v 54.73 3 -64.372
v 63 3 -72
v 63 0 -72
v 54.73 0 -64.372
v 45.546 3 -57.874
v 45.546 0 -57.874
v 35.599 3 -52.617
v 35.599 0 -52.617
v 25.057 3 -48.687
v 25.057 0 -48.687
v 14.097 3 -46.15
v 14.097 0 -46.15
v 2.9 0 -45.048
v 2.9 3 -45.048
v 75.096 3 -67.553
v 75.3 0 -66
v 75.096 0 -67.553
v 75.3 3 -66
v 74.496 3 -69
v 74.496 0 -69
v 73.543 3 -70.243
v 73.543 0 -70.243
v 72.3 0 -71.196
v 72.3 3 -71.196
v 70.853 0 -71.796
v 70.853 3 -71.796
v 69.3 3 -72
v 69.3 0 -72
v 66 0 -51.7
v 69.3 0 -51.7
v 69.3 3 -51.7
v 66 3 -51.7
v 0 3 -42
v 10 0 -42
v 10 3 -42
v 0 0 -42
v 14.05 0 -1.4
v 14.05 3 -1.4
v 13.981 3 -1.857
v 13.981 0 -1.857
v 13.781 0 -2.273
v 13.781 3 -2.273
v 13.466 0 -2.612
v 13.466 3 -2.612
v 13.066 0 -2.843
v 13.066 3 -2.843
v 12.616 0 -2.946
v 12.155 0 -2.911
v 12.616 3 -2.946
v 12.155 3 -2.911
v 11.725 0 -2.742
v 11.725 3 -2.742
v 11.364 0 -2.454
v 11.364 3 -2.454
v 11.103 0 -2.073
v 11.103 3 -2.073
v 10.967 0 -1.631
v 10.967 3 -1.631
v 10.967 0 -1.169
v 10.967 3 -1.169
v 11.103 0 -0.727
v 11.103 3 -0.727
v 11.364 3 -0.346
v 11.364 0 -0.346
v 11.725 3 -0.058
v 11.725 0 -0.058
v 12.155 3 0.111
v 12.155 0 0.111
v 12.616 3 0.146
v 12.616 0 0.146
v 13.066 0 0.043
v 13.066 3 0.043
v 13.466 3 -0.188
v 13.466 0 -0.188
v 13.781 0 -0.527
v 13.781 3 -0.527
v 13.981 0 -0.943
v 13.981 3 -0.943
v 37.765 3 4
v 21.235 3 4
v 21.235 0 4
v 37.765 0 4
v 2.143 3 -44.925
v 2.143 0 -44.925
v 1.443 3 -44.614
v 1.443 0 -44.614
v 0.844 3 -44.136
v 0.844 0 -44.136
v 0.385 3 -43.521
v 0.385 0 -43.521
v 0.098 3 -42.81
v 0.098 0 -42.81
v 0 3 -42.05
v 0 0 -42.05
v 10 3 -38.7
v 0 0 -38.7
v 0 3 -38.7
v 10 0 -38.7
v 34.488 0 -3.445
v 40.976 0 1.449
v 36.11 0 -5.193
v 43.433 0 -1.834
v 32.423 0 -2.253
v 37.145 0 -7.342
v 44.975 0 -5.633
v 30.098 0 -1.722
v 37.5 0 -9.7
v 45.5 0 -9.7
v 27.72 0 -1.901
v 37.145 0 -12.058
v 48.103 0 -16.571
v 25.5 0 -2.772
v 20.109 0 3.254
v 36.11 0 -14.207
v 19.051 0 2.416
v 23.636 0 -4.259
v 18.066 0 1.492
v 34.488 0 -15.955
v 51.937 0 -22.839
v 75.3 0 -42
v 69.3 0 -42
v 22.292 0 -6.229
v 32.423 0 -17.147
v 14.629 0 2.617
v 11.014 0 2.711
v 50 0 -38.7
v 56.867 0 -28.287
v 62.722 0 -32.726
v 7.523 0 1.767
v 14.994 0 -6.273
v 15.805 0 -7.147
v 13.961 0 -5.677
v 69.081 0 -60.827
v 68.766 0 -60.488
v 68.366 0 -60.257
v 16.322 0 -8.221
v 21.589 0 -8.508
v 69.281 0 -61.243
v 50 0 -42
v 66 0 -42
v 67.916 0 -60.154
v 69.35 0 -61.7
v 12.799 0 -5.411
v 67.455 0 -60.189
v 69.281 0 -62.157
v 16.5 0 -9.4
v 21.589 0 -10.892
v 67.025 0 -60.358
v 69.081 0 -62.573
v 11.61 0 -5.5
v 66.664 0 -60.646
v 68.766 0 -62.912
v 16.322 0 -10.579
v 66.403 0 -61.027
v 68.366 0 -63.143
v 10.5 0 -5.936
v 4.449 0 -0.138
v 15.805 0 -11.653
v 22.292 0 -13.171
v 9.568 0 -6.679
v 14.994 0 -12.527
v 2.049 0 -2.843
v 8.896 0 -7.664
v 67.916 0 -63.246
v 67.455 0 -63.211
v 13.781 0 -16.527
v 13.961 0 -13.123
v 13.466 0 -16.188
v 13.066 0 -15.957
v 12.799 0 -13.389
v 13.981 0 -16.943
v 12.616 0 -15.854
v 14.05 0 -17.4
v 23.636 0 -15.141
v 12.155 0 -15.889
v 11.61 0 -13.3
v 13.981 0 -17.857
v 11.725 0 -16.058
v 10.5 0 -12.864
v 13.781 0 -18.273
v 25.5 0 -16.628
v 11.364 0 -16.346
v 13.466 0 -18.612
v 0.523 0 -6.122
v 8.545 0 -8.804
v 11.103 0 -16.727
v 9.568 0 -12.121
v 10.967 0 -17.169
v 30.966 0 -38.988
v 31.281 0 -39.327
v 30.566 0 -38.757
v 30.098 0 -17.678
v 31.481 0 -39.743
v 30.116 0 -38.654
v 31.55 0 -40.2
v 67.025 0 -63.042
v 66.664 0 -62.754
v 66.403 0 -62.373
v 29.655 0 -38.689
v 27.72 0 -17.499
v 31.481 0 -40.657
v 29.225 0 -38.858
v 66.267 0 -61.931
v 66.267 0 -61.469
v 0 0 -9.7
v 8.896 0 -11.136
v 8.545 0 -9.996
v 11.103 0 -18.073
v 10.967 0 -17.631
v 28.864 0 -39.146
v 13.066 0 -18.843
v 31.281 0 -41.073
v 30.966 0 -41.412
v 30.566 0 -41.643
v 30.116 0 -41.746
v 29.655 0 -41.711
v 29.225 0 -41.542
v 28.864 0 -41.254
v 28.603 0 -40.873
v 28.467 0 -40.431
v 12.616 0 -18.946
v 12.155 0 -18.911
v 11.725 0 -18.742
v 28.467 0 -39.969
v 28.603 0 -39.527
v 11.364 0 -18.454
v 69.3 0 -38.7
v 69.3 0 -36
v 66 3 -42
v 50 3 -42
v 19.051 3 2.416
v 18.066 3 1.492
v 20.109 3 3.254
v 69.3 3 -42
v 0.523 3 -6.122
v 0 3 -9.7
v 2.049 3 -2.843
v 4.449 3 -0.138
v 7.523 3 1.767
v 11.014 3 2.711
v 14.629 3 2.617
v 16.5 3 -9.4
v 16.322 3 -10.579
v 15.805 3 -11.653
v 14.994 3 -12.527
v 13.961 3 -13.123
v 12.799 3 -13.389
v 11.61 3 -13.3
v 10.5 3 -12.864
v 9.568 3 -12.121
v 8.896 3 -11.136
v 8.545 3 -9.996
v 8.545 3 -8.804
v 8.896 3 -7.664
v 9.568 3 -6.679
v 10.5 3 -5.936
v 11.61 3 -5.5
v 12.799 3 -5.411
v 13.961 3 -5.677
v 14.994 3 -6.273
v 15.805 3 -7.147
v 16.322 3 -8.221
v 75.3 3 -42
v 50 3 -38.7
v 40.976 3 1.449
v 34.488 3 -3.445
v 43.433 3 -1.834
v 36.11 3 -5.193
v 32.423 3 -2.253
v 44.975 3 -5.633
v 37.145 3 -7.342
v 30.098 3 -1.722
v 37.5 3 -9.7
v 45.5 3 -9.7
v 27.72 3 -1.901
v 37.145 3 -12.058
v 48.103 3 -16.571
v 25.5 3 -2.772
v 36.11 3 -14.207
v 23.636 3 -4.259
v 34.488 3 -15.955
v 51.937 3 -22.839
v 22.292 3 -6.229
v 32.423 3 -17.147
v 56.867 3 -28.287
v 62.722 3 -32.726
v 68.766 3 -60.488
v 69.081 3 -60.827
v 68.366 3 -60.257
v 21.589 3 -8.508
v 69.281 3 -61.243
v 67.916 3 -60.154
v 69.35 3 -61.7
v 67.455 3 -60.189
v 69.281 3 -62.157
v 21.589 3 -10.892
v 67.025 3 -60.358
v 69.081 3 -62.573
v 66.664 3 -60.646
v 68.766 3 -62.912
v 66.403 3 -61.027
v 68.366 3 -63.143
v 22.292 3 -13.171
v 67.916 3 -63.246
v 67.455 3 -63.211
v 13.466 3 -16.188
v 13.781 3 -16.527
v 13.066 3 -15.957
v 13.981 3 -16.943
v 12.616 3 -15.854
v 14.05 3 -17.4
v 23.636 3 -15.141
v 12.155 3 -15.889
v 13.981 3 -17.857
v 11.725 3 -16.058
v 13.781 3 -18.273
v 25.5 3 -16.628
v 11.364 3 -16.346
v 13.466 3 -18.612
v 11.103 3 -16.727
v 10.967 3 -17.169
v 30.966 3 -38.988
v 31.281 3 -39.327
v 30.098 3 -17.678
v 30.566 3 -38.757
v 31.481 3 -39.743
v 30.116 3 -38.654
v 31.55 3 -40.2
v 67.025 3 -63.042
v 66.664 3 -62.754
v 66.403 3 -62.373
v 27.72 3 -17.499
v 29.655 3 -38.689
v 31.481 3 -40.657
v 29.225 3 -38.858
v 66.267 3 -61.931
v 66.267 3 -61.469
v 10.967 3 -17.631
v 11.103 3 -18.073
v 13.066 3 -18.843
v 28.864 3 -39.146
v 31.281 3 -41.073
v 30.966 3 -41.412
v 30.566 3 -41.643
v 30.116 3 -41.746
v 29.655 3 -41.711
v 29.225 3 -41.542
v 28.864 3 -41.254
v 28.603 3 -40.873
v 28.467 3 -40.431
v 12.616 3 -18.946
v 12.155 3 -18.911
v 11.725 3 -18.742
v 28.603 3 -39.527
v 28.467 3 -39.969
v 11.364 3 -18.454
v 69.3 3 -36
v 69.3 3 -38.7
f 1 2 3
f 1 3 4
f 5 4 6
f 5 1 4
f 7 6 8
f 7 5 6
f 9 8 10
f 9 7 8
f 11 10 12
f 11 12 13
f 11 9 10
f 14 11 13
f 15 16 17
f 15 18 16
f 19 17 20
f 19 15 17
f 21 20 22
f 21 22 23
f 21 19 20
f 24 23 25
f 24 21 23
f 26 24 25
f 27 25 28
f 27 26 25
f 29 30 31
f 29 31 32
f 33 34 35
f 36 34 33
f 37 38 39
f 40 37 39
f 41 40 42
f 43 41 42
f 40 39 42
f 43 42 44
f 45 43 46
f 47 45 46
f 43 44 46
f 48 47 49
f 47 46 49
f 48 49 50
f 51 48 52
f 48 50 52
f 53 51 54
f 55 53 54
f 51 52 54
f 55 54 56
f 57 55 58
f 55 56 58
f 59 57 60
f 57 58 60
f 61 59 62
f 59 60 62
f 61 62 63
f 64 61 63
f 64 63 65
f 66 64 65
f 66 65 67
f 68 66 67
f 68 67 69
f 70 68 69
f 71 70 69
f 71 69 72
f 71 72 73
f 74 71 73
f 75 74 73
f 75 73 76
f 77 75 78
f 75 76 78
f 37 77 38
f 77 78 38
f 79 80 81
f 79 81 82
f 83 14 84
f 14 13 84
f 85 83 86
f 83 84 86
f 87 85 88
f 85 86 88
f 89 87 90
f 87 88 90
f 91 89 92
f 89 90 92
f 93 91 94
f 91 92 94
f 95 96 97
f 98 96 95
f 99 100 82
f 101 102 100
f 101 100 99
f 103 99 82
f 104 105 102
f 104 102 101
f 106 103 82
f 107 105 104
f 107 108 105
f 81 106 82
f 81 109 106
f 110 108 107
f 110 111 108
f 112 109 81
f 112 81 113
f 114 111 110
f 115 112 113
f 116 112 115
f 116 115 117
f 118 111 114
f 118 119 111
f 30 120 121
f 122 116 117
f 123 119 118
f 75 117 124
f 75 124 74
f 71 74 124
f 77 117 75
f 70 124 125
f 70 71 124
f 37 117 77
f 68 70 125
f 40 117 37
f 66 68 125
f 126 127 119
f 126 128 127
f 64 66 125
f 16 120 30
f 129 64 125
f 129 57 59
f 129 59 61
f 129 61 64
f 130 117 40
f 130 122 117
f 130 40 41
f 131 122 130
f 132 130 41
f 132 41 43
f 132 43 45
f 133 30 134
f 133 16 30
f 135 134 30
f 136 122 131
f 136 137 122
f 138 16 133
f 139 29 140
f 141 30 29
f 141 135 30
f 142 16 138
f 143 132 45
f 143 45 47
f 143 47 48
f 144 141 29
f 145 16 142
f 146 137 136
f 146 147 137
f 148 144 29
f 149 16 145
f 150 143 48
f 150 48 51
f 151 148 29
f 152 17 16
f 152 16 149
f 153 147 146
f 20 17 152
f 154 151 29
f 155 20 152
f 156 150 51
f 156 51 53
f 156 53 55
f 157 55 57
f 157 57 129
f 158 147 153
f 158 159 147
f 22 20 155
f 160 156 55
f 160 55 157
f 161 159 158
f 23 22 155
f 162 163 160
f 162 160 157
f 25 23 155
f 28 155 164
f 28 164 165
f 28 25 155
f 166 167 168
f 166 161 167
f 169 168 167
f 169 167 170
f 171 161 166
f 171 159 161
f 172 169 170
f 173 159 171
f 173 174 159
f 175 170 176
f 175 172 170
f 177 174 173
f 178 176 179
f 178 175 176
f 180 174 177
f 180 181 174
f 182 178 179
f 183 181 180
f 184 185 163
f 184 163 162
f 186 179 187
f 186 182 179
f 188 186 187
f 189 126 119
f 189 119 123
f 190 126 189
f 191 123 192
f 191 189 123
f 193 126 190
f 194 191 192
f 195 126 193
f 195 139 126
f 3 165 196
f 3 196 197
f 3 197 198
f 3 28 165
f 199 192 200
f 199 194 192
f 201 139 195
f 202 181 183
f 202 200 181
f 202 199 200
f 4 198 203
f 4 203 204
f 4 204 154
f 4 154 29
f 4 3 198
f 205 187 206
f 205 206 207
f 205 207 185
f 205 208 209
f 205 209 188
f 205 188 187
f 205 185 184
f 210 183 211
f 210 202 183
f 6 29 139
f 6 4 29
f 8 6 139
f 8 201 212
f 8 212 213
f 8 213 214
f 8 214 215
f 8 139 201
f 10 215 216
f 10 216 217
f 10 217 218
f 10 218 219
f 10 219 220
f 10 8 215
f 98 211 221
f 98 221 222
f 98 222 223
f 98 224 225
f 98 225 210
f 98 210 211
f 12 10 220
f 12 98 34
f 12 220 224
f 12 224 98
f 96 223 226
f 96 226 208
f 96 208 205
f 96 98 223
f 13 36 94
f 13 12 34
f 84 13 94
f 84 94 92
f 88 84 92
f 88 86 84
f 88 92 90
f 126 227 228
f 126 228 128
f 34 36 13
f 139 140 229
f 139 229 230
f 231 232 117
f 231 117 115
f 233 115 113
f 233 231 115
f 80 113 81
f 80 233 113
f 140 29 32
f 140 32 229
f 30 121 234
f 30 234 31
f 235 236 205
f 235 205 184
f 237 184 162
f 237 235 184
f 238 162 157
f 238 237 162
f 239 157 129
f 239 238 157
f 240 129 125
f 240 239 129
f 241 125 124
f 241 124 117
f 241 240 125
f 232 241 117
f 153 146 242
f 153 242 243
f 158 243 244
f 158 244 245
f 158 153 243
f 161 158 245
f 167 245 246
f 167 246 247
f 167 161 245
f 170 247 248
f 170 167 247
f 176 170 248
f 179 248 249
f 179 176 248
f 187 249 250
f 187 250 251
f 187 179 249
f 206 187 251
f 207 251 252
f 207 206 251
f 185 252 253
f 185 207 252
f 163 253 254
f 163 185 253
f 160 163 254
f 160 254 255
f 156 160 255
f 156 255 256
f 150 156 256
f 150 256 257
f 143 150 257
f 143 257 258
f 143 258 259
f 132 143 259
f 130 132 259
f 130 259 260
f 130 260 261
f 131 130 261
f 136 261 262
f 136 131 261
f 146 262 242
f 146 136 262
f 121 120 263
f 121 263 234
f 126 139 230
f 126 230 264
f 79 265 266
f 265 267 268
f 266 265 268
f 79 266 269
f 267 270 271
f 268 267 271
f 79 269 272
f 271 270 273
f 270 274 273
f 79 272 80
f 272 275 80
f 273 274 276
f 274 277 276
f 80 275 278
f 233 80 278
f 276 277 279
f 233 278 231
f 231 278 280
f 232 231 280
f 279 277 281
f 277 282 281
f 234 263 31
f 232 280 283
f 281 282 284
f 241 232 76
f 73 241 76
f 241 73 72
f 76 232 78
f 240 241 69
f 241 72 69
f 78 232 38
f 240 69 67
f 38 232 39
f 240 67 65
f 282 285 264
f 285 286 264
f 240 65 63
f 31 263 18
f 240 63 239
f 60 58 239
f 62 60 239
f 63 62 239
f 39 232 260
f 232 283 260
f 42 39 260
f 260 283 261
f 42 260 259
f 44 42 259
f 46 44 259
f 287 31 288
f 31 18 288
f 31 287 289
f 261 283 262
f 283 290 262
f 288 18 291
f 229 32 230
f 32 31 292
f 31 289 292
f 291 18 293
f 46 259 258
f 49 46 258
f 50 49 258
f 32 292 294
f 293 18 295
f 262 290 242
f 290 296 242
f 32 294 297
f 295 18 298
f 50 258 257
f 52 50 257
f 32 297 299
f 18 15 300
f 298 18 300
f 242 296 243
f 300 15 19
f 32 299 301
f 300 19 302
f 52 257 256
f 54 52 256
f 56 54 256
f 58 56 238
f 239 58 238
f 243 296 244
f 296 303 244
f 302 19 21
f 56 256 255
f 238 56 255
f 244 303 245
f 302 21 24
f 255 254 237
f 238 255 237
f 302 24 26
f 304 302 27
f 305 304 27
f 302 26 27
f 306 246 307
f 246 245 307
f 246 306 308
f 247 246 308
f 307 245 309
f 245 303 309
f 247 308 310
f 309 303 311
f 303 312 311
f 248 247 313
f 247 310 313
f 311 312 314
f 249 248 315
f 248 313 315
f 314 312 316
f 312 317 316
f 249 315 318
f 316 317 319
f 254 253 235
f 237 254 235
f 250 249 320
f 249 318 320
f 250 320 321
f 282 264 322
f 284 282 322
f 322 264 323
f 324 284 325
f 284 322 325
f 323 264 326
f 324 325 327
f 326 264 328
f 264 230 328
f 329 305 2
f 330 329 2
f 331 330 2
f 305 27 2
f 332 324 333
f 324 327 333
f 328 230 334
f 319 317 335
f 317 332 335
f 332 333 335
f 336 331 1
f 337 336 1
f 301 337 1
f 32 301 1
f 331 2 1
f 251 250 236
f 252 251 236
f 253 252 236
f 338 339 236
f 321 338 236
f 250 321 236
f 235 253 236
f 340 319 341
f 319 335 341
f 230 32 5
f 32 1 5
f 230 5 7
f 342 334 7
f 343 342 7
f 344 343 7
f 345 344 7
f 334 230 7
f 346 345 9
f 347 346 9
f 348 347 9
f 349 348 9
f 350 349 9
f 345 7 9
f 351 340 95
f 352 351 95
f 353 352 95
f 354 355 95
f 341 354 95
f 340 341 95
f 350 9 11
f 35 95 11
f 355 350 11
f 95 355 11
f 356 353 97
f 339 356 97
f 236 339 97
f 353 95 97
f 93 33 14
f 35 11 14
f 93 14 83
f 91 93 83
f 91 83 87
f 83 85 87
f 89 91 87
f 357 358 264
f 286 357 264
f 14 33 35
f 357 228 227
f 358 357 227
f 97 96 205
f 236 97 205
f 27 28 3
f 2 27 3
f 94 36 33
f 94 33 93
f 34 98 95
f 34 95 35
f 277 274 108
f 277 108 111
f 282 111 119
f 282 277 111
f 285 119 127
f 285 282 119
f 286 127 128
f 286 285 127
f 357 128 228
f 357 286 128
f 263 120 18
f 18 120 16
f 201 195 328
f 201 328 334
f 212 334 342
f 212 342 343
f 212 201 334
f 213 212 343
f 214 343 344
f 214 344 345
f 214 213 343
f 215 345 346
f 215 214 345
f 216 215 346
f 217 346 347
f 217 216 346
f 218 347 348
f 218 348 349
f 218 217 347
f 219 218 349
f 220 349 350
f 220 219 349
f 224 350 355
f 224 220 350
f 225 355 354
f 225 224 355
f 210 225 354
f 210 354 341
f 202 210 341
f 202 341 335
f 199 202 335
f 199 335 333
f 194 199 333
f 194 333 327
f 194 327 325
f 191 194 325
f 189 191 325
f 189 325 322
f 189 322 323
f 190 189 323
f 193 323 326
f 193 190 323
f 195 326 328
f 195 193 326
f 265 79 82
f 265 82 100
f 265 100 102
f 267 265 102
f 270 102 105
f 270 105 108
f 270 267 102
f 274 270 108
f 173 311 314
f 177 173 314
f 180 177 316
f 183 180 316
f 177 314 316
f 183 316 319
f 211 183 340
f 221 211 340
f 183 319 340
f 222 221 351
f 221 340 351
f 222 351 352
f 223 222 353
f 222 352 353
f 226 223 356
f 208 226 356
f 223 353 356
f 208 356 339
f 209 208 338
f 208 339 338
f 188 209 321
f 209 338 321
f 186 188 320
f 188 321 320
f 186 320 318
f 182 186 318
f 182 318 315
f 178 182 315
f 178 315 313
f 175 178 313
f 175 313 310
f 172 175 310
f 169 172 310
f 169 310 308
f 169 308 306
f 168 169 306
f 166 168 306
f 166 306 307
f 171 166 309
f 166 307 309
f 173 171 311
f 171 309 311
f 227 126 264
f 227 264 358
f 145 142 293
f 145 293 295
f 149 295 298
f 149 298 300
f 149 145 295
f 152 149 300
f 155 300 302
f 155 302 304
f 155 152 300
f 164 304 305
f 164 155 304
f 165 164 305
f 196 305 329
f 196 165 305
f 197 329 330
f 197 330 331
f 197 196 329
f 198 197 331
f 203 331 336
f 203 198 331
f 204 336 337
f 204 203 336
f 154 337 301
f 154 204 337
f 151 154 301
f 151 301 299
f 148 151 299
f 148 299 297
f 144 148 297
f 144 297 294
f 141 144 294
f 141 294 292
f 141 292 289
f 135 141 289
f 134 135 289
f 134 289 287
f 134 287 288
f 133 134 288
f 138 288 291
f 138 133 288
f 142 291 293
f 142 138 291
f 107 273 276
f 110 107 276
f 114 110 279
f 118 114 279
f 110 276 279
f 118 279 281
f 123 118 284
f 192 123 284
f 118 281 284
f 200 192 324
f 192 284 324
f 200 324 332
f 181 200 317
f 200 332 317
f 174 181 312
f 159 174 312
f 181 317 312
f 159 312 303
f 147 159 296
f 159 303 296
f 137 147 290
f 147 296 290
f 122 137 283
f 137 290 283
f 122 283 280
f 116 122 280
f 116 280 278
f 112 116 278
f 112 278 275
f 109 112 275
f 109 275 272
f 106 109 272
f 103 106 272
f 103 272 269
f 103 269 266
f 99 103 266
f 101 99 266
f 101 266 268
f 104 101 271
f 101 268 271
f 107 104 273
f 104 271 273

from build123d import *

# Parameters (mm, degrees)
CROQUIS1_R               = 1.55
CROQUIS1_R_2             = 4
SALIENTE_EXTRUIR10_DEPTH = 3
CROQUIS2_R               = 8
CROQUIS2_R_2             = 1.55
CORTAR_EXTRUIR1_DEPTH    = 3
CROQUIS3_OUTSIDE_W       = 98.706
CROQUIS3_OUTSIDE_H       = 99.406
CROQUIS3_OUTSIDE_R       = 4
CROQUIS3_OUTSIDE_R_2     = 8
CROQUIS3_OUTSIDE_R_3     = 1.55
CORTAR_EXTRUIR2_DEPTH    = 3
REDONDEO1_R              = 6
REDONDEO2_R              = 3


with BuildPart() as part:
    # Croquis1 → Saliente-Extruir10 (new body)
    with BuildSketch(Plane(origin=(0, 0, 0), x_dir=(1, 0, 0), z_dir=(0, 1, 0))):
        Polygon((0, 0), (0, 38.7), (10, 38.7), (10, 42), (0, 42), (0, 72), (69.3, 72), (75.3, 72), (75.3, 52), (75.3, 42), (69.3, 42), (69.3, 51.7), (66, 51.7), (66, 42), (50, 42), (50, 38.7), (69.3, 38.7), (69.3, 0), (69.3, -4), (0, -4), align=None)
        with Locations((30, 40.2)):
            Circle(CROQUIS1_R, mode=Mode.SUBTRACT)
        with Locations((67.8, 61.7)):
            Circle(CROQUIS1_R, mode=Mode.SUBTRACT)
        with Locations((12.5, 9.4)):
            Circle(CROQUIS1_R_2, mode=Mode.SUBTRACT)
    extrude(amount=SALIENTE_EXTRUIR10_DEPTH)

    # Croquis2 → Cortar-Extruir1 (cut)
    with BuildSketch(Plane(origin=(0, 3, 0), x_dir=(1, 0, 0), z_dir=(0, 1, 0))):
        with Locations((29.5, 9.7)):
            Circle(CROQUIS2_R)
        with Locations((12.5, 17.4)):
            Circle(CROQUIS2_R_2)
        with Locations((12.5, 1.4)):
            Circle(CROQUIS2_R_2)
    extrude(amount=-CORTAR_EXTRUIR1_DEPTH, mode=Mode.SUBTRACT)

    # Croquis3 outside → Cortar-Extruir2 (cut)
    with BuildSketch(Plane(origin=(0, 3, 0), x_dir=(1, 0, 0), z_dir=(0, 1, 0))):
        with Locations((37.65, 34)):
            Rectangle(CROQUIS3_OUTSIDE_W, CROQUIS3_OUTSIDE_H)
        with BuildLine():
            Line((75.3, 72), (63, 72))
            ThreePointArc((63, 72), (34.270978976, 52.034382388), (0, 45))
            Line((0, 45), (0, 42))
            Line((0, 42), (10, 42))
            Line((10, 42), (10, 38.7))
            Line((10, 38.7), (0, 38.7))
            Line((0, 38.7), (0, 9.7))
            ThreePointArc((0, 9.7), (5.916961411, -0.92608126), (18.066176471, -1.492304477))
            ThreePointArc((18.066176471, -1.492304477), (19.571107199, -2.84659666), (21.235013612, -4))
            Line((21.235013612, -4), (37.764986388, -4))
            ThreePointArc((37.764986388, -4), (43.432691452, 1.833608903), (45.5, 9.7))
            ThreePointArc((45.5, 9.7), (54.274410069, 25.678480622), (69.3, 36))
            Line((69.3, 36), (69.3, 38.7))
            Line((69.3, 38.7), (50, 38.7))
            Line((50, 38.7), (50, 42))
            Line((50, 42), (66, 42))
            Line((66, 42), (66, 51.7))
            Line((66, 51.7), (69.3, 51.7))
            Line((69.3, 51.7), (69.3, 42))
            Line((69.3, 42), (75.3, 42))
            Line((75.3, 42), (75.3, 72))
        make_face(mode=Mode.SUBTRACT)
        with Locations((12.5, 9.4)):
            Circle(CROQUIS3_OUTSIDE_R)
        with Locations((29.5, 9.7)):
            Circle(CROQUIS3_OUTSIDE_R_2)
        with Locations((30, 40.2)):
            Circle(CROQUIS3_OUTSIDE_R_3)
        with Locations((67.8, 61.7)):
            Circle(CROQUIS3_OUTSIDE_R_3)
    extrude(amount=-CORTAR_EXTRUIR2_DEPTH, mode=Mode.SUBTRACT)

    # Redondeo1
    redondeo1_edges = [part.edges().sort_by_distance(p)[0] for p in [
        (75.3, 1.5, -72),
    ]]
    fillet(redondeo1_edges, radius=REDONDEO1_R)

    # Redondeo2
    redondeo2_edges = [part.edges().sort_by_distance(p)[0] for p in [
        (0, 1.5, -45),
    ]]
    fillet(redondeo2_edges, radius=REDONDEO2_R)


solid = part.part
